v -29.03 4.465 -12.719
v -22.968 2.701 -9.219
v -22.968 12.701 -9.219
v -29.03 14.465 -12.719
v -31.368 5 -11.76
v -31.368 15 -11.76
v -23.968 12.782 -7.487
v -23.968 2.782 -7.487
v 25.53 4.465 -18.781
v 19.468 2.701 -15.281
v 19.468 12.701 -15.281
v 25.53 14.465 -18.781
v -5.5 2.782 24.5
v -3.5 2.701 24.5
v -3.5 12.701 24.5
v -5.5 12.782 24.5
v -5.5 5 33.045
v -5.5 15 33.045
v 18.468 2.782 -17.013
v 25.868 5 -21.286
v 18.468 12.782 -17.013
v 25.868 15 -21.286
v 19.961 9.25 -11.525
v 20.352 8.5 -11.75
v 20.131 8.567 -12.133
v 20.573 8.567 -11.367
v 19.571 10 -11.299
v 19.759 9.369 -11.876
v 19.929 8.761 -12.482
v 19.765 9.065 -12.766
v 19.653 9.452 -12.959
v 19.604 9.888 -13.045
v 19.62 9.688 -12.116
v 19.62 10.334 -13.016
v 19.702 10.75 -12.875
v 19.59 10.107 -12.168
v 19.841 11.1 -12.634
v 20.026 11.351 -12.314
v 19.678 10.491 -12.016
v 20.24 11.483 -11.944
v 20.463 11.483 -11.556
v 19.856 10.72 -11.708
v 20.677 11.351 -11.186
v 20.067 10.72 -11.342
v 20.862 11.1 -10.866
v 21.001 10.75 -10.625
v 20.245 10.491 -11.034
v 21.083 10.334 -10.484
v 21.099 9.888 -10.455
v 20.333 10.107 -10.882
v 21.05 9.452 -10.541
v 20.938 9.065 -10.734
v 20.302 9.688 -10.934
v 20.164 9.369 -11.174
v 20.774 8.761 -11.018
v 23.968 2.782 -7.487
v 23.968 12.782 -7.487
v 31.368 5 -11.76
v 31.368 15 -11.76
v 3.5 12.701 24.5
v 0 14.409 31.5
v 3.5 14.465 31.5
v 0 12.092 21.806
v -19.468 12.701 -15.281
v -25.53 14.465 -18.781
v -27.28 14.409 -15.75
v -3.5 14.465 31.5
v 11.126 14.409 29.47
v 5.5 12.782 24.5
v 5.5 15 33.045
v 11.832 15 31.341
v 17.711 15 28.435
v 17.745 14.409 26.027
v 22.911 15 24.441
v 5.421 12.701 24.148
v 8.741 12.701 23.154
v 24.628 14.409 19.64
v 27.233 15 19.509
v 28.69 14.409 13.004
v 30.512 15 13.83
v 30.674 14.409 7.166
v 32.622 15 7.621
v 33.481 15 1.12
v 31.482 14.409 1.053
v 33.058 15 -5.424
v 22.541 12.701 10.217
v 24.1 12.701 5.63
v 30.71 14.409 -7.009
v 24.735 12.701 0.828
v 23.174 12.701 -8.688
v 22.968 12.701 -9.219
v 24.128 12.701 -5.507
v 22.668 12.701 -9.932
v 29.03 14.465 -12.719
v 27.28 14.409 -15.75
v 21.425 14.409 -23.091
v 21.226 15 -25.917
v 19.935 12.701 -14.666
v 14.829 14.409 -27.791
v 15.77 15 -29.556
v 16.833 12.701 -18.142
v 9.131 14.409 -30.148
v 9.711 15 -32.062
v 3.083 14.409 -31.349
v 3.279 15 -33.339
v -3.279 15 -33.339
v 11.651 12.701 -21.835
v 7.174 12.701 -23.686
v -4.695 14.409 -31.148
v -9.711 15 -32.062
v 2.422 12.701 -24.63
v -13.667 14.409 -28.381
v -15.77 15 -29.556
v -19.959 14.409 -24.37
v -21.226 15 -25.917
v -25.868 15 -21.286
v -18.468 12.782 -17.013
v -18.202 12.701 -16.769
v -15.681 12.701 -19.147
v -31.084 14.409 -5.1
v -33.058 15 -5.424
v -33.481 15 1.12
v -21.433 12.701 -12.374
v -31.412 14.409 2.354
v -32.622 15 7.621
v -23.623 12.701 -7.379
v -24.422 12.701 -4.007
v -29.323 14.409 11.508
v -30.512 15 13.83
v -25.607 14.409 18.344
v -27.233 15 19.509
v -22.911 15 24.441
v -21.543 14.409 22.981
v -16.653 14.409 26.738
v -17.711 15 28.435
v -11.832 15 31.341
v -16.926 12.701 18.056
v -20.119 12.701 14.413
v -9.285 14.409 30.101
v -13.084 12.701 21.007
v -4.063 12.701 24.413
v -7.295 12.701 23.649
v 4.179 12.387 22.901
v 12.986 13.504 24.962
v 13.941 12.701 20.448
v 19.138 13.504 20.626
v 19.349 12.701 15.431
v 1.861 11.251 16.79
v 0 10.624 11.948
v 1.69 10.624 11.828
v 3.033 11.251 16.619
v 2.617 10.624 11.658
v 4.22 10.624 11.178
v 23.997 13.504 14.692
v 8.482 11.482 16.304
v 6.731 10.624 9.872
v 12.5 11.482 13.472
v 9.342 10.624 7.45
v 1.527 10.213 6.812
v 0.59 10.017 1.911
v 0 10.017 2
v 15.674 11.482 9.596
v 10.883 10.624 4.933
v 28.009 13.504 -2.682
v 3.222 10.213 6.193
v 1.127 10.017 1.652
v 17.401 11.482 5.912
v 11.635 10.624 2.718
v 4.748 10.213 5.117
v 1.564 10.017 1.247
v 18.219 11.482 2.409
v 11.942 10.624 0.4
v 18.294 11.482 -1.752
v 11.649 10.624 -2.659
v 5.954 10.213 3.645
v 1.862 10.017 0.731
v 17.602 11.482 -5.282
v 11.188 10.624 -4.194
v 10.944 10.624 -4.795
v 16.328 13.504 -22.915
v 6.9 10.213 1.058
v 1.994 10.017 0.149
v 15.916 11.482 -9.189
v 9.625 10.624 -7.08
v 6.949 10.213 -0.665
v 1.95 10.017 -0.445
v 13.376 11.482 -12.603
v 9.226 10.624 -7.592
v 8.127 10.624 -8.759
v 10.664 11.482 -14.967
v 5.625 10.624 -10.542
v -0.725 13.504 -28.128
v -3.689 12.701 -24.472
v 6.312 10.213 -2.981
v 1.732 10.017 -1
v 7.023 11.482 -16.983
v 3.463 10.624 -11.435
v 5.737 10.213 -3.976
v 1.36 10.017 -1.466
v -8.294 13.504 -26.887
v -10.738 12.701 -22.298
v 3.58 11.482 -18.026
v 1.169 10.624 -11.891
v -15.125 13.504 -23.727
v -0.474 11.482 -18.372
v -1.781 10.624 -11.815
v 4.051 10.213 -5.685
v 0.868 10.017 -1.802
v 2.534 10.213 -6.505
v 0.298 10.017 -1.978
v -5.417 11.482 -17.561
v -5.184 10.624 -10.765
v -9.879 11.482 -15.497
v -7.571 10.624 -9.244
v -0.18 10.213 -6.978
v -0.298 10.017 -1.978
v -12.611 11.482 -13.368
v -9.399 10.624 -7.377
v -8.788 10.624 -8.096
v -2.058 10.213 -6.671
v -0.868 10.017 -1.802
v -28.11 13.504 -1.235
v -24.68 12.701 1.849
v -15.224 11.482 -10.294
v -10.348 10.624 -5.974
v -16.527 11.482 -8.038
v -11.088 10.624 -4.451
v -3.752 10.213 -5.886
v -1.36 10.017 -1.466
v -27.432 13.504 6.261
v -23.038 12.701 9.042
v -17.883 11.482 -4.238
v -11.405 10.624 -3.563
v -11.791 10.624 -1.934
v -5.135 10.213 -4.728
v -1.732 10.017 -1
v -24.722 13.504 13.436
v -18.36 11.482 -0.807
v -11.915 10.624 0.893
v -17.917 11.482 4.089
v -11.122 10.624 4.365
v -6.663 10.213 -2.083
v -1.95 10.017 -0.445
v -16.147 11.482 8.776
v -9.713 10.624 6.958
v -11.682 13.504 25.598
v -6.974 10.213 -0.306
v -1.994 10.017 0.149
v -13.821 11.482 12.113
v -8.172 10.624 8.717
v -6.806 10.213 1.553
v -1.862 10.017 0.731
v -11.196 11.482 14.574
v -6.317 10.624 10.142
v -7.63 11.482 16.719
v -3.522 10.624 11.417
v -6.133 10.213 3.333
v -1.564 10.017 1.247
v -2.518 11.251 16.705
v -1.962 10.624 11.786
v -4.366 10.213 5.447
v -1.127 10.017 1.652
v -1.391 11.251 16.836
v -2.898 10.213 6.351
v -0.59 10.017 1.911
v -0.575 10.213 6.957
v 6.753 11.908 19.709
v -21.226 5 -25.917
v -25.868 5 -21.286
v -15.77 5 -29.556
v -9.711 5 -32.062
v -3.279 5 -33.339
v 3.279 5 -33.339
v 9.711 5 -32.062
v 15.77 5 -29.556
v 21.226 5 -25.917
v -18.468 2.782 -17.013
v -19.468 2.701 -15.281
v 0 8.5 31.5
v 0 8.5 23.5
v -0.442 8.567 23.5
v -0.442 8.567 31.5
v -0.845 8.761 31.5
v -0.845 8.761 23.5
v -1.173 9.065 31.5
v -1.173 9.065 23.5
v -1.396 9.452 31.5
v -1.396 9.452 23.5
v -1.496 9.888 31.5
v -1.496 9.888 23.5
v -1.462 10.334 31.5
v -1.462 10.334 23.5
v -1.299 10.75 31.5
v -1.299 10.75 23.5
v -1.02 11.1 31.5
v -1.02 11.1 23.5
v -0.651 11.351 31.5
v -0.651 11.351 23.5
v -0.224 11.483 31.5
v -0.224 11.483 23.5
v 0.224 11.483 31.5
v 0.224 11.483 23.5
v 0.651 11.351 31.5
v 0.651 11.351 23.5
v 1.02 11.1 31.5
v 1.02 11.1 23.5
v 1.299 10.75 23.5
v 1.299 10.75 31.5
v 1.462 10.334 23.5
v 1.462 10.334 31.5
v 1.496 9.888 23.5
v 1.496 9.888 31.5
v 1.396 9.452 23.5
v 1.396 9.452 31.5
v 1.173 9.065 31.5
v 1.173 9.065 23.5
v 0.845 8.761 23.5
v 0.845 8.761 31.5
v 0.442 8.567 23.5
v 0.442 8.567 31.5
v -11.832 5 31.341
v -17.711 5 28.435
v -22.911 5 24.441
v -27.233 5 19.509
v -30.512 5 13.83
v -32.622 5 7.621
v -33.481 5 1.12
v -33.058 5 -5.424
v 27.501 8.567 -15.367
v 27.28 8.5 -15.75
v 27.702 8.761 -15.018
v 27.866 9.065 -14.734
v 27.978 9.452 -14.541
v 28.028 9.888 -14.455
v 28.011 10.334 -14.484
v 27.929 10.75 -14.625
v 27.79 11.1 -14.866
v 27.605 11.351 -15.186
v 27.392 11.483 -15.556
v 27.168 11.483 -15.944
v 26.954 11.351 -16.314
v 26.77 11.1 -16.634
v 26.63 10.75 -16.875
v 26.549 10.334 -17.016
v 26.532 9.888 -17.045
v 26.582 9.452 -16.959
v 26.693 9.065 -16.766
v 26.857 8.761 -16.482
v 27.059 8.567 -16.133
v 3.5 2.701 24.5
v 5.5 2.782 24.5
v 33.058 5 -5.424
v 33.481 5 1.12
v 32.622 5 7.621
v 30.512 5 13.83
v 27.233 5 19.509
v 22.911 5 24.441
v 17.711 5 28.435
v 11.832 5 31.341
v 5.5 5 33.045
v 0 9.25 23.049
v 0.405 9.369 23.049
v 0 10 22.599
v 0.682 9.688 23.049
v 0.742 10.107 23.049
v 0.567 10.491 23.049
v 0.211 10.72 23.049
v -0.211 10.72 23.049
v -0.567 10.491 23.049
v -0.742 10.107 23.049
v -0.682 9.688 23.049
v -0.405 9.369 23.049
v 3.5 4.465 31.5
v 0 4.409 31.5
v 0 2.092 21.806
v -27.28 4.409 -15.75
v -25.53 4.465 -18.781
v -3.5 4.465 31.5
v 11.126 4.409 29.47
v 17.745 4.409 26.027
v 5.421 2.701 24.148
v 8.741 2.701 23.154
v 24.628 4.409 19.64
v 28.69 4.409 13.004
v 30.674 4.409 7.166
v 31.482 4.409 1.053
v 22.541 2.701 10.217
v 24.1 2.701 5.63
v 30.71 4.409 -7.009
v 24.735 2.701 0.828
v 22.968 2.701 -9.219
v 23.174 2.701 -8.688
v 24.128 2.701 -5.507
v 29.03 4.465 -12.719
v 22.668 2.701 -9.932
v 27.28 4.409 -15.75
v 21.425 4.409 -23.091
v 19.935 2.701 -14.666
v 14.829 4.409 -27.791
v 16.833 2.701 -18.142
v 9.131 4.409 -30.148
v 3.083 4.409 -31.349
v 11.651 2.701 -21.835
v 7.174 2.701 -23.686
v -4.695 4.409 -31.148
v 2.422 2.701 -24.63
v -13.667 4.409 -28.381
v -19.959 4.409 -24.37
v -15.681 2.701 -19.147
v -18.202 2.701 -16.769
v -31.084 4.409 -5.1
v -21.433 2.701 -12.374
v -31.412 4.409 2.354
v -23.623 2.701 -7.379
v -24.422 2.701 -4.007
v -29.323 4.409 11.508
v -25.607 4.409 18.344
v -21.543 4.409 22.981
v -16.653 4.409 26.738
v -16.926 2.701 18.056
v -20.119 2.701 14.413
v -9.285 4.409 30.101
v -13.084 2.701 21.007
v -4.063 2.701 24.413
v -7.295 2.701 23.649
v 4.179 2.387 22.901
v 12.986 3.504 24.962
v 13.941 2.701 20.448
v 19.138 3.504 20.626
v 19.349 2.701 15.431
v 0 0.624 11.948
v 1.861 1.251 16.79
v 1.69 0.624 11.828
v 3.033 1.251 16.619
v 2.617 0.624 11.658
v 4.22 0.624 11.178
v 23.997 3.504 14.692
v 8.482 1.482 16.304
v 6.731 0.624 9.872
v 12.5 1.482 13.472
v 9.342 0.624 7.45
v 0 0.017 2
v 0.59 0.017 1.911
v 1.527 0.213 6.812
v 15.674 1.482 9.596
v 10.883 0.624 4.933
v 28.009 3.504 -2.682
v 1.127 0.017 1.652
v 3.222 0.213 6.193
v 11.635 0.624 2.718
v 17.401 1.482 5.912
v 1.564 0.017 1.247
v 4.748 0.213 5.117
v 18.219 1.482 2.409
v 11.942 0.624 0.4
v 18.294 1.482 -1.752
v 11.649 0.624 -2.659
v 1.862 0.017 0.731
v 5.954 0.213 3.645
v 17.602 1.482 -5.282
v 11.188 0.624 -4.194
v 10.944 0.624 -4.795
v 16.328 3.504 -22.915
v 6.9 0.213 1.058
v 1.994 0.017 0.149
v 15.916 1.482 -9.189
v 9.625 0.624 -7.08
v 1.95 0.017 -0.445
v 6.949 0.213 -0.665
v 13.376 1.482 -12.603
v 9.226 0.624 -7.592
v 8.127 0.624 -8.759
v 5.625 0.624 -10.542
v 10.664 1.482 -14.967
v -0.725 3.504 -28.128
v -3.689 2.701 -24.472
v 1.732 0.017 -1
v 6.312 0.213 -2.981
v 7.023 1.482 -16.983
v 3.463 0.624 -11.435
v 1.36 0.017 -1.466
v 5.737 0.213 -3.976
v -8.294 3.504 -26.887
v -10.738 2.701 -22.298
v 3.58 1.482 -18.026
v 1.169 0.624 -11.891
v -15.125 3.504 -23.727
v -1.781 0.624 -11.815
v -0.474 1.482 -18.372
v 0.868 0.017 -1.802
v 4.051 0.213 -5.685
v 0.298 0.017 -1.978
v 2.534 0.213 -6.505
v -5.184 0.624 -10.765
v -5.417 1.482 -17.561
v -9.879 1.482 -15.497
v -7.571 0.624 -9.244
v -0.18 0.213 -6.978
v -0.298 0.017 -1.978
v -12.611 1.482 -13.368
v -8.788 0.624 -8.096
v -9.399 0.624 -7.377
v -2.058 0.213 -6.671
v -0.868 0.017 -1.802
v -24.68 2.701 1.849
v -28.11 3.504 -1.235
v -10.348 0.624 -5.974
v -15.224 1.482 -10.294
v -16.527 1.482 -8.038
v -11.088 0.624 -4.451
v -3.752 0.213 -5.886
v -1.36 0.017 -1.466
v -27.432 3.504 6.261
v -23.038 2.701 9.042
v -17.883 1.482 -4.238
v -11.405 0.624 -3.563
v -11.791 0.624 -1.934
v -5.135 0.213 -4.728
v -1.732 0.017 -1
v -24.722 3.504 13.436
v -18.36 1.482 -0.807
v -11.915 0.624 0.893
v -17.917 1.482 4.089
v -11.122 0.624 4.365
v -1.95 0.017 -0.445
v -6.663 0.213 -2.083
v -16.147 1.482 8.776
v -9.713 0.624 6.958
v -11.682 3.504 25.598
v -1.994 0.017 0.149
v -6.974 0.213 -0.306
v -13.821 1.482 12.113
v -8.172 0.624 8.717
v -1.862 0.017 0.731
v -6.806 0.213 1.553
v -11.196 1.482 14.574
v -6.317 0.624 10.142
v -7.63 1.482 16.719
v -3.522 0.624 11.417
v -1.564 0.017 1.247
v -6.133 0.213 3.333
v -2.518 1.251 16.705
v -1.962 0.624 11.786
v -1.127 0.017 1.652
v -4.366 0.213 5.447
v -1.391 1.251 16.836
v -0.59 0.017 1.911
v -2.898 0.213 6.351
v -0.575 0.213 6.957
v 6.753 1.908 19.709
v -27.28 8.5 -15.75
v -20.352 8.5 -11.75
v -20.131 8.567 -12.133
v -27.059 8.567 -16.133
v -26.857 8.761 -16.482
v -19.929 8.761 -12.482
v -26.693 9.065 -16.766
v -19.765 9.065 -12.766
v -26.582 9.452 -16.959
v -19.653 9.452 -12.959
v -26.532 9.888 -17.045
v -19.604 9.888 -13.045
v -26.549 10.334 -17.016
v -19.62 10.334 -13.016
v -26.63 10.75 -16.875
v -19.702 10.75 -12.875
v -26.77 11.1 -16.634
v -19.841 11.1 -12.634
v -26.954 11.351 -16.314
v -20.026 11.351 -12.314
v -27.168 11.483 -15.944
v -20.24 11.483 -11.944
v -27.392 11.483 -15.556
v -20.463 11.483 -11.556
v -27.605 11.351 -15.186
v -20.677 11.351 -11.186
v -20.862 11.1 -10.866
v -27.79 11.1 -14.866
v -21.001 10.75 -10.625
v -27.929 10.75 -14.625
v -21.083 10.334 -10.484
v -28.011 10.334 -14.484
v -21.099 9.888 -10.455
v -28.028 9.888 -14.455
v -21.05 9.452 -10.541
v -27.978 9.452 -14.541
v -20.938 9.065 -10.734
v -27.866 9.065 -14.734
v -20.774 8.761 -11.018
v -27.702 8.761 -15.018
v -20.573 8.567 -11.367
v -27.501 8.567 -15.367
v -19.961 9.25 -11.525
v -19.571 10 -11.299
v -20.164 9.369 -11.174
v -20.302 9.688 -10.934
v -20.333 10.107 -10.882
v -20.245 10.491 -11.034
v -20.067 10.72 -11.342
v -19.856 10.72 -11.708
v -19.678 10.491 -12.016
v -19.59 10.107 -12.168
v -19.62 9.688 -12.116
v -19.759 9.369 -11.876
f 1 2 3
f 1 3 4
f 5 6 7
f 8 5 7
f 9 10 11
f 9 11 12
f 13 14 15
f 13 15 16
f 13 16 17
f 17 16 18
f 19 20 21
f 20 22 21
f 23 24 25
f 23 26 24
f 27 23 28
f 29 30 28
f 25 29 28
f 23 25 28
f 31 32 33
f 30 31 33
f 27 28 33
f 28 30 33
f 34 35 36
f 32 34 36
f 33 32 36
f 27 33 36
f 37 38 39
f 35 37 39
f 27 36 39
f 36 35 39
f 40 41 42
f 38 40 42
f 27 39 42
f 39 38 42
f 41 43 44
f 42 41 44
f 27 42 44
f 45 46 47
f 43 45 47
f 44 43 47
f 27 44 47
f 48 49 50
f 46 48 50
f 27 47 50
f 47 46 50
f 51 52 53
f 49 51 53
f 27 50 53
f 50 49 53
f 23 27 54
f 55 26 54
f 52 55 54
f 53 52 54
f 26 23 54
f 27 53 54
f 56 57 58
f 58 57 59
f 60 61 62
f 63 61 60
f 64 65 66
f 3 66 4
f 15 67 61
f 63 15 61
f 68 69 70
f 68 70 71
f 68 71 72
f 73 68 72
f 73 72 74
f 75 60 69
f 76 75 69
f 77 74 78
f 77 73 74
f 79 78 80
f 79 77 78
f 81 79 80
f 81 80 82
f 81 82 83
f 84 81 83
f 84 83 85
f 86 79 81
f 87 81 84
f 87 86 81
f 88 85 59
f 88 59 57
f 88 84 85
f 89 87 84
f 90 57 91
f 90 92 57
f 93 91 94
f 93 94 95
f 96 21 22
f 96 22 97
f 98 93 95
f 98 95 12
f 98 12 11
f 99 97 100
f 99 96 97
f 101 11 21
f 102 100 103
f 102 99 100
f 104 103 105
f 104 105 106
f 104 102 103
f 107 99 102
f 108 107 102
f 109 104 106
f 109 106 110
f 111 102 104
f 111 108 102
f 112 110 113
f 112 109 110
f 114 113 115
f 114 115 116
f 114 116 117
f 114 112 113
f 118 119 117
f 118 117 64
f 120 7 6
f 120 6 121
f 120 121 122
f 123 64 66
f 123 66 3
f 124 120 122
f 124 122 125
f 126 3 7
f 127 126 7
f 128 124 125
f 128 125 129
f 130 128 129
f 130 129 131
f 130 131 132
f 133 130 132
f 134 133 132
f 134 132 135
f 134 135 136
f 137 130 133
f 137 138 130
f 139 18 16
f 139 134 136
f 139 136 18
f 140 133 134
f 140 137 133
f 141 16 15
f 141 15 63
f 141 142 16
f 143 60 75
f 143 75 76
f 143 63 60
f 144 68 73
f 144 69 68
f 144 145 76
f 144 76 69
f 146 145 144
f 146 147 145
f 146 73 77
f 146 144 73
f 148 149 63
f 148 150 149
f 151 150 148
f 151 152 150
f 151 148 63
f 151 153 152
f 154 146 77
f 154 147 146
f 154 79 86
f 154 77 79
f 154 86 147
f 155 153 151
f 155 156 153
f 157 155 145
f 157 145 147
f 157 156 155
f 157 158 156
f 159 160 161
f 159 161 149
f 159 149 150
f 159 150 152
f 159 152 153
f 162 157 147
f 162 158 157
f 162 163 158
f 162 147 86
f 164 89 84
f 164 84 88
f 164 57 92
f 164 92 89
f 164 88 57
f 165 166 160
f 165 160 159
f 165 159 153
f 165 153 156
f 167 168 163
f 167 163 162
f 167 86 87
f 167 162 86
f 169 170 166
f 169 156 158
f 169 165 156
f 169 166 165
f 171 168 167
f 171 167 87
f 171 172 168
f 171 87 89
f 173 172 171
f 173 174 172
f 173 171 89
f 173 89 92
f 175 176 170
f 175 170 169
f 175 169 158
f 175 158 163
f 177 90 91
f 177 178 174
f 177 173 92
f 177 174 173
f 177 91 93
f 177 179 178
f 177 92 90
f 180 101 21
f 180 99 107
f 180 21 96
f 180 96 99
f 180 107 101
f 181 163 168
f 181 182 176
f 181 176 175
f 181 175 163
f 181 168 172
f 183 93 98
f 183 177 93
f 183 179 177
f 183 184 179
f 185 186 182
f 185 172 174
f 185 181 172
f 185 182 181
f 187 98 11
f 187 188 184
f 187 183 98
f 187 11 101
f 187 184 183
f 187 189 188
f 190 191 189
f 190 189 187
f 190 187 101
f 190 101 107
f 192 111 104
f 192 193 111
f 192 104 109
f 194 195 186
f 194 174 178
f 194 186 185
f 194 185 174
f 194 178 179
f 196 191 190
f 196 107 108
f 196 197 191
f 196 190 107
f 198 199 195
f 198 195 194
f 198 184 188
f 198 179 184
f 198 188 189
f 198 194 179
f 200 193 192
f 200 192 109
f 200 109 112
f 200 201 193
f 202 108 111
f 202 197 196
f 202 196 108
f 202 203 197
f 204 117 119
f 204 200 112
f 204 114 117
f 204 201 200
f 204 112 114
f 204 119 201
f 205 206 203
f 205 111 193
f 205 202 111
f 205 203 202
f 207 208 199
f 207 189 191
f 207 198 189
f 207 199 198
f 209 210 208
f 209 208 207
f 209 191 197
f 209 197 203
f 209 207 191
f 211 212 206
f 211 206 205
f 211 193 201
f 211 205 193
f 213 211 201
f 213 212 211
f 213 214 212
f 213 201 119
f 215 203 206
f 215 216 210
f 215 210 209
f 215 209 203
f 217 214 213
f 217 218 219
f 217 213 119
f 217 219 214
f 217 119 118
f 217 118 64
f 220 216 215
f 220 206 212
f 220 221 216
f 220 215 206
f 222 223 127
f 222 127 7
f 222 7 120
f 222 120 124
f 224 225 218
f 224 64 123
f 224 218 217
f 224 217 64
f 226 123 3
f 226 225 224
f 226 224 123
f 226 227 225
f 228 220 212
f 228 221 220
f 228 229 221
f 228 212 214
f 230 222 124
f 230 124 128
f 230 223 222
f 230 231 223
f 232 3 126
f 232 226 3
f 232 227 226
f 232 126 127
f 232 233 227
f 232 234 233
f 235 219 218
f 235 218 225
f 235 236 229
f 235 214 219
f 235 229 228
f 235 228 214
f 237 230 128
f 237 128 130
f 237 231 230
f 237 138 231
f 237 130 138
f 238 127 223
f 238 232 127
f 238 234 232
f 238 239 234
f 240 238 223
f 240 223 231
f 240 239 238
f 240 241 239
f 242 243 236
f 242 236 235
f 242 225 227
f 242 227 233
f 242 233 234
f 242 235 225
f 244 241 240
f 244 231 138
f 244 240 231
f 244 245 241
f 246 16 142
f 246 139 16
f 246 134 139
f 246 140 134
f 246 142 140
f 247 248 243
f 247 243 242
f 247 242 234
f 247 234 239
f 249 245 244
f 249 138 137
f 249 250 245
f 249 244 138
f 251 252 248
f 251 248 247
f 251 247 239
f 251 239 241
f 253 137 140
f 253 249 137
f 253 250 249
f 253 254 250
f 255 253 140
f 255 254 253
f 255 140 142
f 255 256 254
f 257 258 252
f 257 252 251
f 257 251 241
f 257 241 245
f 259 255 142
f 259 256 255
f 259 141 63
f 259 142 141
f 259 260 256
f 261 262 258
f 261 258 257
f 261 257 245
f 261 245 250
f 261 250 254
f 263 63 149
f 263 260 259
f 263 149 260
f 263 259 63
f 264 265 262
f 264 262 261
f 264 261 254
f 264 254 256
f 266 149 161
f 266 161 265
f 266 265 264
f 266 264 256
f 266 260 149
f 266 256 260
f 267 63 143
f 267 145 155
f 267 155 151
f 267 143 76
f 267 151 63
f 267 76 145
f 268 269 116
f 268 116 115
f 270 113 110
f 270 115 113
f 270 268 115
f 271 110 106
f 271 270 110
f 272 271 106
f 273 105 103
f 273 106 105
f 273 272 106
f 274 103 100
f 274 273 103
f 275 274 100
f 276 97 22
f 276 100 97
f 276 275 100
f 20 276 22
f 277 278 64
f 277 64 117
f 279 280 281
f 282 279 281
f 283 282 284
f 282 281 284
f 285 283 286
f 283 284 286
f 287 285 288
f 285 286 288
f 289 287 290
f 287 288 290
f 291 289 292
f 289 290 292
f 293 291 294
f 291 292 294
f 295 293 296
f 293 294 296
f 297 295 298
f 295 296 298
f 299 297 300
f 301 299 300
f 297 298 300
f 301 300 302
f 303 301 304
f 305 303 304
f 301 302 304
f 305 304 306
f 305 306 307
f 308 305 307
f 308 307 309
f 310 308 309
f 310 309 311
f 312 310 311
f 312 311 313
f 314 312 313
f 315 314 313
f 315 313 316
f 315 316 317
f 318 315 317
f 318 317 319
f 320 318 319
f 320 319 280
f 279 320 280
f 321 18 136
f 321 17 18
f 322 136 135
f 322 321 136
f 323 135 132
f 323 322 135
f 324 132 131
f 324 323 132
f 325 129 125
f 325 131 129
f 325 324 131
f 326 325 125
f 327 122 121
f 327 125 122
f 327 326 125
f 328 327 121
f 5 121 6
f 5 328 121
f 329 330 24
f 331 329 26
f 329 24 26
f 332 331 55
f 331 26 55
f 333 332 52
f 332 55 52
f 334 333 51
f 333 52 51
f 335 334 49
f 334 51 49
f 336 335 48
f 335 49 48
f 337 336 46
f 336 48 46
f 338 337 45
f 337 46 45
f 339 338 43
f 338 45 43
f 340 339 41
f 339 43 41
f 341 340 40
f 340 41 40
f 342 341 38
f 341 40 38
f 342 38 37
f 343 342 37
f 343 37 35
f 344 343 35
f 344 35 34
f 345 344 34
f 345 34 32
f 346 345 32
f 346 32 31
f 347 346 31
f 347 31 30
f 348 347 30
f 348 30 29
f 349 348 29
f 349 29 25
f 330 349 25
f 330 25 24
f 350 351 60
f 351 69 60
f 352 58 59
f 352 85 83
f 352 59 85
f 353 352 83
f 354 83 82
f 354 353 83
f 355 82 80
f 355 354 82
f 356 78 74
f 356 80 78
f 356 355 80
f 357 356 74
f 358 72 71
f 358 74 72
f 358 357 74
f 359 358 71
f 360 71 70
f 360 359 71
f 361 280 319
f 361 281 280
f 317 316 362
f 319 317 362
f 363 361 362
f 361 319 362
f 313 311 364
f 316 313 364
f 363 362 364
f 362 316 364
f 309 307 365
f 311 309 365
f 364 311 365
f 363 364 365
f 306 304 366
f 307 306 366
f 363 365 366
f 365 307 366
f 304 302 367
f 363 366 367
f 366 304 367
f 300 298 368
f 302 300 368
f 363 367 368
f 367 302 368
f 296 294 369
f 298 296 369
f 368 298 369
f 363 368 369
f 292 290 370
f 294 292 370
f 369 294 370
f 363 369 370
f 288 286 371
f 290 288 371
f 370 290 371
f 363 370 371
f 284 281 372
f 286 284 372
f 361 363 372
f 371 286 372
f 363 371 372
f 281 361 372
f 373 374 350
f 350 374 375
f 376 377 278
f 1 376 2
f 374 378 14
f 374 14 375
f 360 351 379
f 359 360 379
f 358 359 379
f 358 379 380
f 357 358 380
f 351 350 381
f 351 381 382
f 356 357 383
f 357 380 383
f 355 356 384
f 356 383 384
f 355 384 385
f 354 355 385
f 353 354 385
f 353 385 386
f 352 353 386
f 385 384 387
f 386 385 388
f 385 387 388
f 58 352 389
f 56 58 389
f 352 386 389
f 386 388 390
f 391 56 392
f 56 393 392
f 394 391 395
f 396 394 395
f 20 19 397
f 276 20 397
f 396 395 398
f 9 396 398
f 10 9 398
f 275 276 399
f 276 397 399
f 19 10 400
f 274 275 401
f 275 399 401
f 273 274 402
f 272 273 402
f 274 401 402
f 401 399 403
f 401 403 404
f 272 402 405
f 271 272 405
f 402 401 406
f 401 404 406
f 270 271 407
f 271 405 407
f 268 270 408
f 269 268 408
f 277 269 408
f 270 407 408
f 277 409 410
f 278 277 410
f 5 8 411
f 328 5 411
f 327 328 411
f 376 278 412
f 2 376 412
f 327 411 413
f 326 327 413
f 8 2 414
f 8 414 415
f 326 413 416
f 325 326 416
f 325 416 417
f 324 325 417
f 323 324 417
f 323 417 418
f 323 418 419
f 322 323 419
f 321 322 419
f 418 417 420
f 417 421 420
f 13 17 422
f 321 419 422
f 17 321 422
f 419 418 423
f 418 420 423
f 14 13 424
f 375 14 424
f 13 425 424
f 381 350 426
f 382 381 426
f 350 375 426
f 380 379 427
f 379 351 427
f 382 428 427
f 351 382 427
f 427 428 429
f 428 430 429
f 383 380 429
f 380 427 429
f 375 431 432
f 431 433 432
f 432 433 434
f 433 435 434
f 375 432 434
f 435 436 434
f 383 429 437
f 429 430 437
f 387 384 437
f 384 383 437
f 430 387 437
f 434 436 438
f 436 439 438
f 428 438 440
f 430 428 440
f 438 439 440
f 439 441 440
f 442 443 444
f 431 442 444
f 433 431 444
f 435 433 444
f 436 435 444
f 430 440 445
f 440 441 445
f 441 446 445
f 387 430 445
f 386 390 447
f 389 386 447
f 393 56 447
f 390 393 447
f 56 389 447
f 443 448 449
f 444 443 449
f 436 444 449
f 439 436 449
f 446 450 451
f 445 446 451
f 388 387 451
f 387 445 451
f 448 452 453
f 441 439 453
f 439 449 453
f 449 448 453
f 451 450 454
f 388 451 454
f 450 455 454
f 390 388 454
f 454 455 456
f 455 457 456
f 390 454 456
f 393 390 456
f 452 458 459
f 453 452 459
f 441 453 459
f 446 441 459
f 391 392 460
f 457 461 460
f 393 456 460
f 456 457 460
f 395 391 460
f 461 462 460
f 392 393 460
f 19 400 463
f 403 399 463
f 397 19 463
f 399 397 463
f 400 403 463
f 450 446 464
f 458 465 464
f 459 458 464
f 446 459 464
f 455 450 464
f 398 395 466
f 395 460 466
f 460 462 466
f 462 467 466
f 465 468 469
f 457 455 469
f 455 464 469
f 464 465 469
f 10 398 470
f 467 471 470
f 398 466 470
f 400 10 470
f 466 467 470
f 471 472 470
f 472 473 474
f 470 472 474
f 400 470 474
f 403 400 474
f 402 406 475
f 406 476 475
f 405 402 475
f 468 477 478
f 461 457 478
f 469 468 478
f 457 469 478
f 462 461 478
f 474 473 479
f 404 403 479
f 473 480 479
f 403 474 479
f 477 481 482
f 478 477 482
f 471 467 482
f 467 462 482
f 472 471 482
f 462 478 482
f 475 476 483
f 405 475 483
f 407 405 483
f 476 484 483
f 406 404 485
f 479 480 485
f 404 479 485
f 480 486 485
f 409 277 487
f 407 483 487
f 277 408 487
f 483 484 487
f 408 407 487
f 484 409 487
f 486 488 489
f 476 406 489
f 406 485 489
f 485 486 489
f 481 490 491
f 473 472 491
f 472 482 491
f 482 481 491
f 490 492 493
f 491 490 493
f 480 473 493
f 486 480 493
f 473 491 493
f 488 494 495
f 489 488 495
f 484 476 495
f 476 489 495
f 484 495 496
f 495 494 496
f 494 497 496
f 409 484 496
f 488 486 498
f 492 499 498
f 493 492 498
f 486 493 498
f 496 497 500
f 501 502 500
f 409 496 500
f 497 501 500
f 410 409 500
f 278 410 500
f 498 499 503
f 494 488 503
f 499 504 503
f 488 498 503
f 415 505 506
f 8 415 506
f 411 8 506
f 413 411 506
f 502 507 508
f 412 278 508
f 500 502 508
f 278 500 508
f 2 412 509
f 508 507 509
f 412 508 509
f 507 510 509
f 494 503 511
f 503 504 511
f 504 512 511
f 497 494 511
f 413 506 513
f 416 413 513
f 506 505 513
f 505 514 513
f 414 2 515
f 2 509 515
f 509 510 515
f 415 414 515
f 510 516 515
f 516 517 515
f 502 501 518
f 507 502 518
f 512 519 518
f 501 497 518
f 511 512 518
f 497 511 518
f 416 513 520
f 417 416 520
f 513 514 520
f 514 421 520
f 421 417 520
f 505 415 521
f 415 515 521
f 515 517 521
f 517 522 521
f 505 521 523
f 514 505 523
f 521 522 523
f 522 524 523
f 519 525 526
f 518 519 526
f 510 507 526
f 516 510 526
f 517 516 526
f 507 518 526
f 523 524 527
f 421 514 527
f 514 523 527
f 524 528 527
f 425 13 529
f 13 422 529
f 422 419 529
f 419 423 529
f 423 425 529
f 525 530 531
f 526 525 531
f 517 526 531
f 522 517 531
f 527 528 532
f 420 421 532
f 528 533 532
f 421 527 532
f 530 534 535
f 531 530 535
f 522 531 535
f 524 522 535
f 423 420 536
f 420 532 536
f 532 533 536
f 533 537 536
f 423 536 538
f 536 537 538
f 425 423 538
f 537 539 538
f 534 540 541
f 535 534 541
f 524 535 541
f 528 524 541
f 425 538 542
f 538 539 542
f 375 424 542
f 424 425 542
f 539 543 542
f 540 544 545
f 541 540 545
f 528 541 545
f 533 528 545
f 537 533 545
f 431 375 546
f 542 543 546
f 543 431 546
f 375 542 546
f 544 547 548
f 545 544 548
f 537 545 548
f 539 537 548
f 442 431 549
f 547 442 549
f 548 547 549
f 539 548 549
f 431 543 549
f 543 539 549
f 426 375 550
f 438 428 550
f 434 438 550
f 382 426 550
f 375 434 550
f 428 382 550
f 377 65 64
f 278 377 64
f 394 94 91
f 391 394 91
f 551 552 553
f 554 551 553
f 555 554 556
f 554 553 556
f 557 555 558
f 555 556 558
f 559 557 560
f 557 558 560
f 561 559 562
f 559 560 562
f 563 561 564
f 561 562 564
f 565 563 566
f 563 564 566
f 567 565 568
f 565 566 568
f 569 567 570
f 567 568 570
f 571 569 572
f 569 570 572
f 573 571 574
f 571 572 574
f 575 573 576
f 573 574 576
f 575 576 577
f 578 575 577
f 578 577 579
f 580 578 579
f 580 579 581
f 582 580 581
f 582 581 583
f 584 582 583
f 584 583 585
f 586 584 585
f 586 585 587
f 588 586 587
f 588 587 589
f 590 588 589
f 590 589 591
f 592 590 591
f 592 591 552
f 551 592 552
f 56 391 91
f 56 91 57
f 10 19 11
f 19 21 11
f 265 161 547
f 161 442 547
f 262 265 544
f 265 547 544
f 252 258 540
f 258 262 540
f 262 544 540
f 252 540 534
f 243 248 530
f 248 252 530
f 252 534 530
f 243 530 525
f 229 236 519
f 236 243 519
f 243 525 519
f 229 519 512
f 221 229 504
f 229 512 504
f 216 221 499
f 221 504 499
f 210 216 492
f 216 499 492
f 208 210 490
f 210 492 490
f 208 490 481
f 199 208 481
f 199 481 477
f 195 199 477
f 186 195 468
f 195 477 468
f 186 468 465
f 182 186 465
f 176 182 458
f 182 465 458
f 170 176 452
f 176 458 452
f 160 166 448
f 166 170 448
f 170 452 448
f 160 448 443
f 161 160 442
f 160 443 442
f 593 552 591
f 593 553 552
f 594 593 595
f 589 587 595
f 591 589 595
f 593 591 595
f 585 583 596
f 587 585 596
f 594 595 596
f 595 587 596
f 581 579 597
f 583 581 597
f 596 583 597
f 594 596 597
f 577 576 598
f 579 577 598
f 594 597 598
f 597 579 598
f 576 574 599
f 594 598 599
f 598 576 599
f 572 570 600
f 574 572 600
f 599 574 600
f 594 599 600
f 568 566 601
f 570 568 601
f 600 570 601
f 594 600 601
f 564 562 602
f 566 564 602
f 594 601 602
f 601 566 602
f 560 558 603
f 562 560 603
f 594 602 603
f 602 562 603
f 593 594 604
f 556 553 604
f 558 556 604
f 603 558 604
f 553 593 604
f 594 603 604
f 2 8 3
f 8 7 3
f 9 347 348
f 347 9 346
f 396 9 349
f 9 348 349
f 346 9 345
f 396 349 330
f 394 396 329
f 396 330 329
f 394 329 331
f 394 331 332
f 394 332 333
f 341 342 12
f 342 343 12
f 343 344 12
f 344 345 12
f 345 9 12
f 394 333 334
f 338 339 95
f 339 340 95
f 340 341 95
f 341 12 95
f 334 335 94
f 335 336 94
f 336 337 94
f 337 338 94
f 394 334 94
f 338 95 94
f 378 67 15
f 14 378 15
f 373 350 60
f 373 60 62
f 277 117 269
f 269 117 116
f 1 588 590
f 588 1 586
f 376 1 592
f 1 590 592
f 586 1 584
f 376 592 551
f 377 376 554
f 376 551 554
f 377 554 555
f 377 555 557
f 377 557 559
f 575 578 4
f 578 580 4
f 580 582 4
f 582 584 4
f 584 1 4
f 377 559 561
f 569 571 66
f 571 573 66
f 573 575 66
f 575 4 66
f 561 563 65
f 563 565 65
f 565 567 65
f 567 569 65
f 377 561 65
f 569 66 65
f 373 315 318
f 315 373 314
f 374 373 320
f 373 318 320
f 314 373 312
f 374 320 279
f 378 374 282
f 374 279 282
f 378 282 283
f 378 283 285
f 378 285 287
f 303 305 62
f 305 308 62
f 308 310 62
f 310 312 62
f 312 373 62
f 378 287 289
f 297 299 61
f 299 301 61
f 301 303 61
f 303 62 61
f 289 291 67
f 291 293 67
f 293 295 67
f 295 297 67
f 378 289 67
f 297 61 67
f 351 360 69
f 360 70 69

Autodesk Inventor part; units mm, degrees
ref_plane "YZ Plane" through (0, 0, 0) normal (1, 0, 0) x (0, 1, 0)
ref_plane "XY Plane" through (0, 0, 0) normal (0, 0, 1) x (1, 0, 0)
sketch "Sketch2" plane through (0, 0, 0) normal (1, 0, 0) x (0, 1, 0)
  arc A0 (15, 33.5) -> (10, 0) centre (124.725, 0) ccw construction
  arc A1 (5, 33.5) -> (0, 0) centre (114.725, 0) ccw construction
  line L0 (15, 33.5) -> (5, 33.5)
  line L1 (10, 0) -> (0, 0) construction
  line L2 (-26.4367, 0) -> (149.9186, 0) projected
  line L3 (10.0174, 2) -> (0.0174, 2)
  arc A2 (5, 33.5) -> (0.0174, 2) centre (114.725, 0) ccw
  arc A3 (15, 33.5) -> (10.0174, 2) centre (124.725, 0) ccw
  point P0 (0, 0)
  point P1 (15, 0)
  dimension "d6" = 5
  dimension "d8" = 10
  dimension "d10" = 10
  dimension "d12" = 2
revolve "Revolution2" add sketch "Sketch2" angle 360 about axis through (0, -10, 0) along (0, 1, 0)
ref_plane "Work Plane2" through (0, 26.25, 0) normal (0, 1, 0) x (-1, 0, 0)
sketch "Sketch5" plane through (0, 26.25, 0) normal (0, 1, 0) x (-1, 0, 0)
  circle A0 centre (0, 0) radius 33.5 projected
  line L0 (-5.5, 33.0454) -> (5.5, 33.0454) construction
  line L1 (-5.5, 33.0454) -> (-5.5, 24.5)
  line L2 (-5.5, 24.5) -> (-3.5, 24.5)
  line L3 (-3.5, 24.5) -> (-3.5, 31.5)
  line L4 (-3.5, 31.5) -> (3.5, 31.5)
  line L5 (3.5, 31.5) -> (3.5, 24.5)
  line L6 (3.5, 24.5) -> (5.5, 24.5)
  line L7 (5.5, 24.5) -> (5.5, 33.0454)
  circle A1 centre (0, 0) radius 2 projected
  arc A2 (5.5, 33.0454) -> (-5.5, 33.0454) centre (0, 0) ccw
  line L8 (5.5, 33.0454) -> (0, 0) construction
  line L9 (0, 0) -> (0, 33.5) construction
  line L10 (5.5, 24.5) -> (0, 0) construction
  line L11 (6.965, 32.7679) -> (0, 0) construction
  line L12 (6.965, 32.7679) -> (6.5492, 30.8116) construction
  point P0 (0, 31.5)
  dimension "d37" = 11
  dimension "d40" = 2
  dimension "d41" = 2
  dimension "d56" = 9
  dimension "d57" = 2
  dimension "d58" = 33.0454
  dimension "d59" = 2
  dimension "d60" = 0
  dimension "d61" = 0
  dimension "d62" = 12
extrude "Extrusion3" cut sketch "Sketch5" along normal through all both and the other way through all contours L7 L6 L5 L4 L3 L2 L1 A0 picked at (-4.8333, 29.6818)
sketch "Sketch6" plane through (0, 124.725, 31.5) normal (0, 0, 1) x (1, 0, 0)
  line L0 (33.5, -109.725) -> (-33.5, -109.725) projected
  point P0 (0, -124.725)
  point P1 (0, -114.725)
  point P2 (5.5, -109.725)
  point P3 (-5.5, -109.725)
  dimension "d45" = 5
hole "Hole2" at (0, 10, 31.5) direction (0, 0, -1) diameter 3 depth 8 tip angle 118
pattern_circular "Circular Pattern2" count 3 over 360 about axis through (0, 10, 0) along (0, 1, 0) of "Hole2", "Extrusion3"
properties part number "Parachute bulkhead" material "Plastic, Opaque White"
